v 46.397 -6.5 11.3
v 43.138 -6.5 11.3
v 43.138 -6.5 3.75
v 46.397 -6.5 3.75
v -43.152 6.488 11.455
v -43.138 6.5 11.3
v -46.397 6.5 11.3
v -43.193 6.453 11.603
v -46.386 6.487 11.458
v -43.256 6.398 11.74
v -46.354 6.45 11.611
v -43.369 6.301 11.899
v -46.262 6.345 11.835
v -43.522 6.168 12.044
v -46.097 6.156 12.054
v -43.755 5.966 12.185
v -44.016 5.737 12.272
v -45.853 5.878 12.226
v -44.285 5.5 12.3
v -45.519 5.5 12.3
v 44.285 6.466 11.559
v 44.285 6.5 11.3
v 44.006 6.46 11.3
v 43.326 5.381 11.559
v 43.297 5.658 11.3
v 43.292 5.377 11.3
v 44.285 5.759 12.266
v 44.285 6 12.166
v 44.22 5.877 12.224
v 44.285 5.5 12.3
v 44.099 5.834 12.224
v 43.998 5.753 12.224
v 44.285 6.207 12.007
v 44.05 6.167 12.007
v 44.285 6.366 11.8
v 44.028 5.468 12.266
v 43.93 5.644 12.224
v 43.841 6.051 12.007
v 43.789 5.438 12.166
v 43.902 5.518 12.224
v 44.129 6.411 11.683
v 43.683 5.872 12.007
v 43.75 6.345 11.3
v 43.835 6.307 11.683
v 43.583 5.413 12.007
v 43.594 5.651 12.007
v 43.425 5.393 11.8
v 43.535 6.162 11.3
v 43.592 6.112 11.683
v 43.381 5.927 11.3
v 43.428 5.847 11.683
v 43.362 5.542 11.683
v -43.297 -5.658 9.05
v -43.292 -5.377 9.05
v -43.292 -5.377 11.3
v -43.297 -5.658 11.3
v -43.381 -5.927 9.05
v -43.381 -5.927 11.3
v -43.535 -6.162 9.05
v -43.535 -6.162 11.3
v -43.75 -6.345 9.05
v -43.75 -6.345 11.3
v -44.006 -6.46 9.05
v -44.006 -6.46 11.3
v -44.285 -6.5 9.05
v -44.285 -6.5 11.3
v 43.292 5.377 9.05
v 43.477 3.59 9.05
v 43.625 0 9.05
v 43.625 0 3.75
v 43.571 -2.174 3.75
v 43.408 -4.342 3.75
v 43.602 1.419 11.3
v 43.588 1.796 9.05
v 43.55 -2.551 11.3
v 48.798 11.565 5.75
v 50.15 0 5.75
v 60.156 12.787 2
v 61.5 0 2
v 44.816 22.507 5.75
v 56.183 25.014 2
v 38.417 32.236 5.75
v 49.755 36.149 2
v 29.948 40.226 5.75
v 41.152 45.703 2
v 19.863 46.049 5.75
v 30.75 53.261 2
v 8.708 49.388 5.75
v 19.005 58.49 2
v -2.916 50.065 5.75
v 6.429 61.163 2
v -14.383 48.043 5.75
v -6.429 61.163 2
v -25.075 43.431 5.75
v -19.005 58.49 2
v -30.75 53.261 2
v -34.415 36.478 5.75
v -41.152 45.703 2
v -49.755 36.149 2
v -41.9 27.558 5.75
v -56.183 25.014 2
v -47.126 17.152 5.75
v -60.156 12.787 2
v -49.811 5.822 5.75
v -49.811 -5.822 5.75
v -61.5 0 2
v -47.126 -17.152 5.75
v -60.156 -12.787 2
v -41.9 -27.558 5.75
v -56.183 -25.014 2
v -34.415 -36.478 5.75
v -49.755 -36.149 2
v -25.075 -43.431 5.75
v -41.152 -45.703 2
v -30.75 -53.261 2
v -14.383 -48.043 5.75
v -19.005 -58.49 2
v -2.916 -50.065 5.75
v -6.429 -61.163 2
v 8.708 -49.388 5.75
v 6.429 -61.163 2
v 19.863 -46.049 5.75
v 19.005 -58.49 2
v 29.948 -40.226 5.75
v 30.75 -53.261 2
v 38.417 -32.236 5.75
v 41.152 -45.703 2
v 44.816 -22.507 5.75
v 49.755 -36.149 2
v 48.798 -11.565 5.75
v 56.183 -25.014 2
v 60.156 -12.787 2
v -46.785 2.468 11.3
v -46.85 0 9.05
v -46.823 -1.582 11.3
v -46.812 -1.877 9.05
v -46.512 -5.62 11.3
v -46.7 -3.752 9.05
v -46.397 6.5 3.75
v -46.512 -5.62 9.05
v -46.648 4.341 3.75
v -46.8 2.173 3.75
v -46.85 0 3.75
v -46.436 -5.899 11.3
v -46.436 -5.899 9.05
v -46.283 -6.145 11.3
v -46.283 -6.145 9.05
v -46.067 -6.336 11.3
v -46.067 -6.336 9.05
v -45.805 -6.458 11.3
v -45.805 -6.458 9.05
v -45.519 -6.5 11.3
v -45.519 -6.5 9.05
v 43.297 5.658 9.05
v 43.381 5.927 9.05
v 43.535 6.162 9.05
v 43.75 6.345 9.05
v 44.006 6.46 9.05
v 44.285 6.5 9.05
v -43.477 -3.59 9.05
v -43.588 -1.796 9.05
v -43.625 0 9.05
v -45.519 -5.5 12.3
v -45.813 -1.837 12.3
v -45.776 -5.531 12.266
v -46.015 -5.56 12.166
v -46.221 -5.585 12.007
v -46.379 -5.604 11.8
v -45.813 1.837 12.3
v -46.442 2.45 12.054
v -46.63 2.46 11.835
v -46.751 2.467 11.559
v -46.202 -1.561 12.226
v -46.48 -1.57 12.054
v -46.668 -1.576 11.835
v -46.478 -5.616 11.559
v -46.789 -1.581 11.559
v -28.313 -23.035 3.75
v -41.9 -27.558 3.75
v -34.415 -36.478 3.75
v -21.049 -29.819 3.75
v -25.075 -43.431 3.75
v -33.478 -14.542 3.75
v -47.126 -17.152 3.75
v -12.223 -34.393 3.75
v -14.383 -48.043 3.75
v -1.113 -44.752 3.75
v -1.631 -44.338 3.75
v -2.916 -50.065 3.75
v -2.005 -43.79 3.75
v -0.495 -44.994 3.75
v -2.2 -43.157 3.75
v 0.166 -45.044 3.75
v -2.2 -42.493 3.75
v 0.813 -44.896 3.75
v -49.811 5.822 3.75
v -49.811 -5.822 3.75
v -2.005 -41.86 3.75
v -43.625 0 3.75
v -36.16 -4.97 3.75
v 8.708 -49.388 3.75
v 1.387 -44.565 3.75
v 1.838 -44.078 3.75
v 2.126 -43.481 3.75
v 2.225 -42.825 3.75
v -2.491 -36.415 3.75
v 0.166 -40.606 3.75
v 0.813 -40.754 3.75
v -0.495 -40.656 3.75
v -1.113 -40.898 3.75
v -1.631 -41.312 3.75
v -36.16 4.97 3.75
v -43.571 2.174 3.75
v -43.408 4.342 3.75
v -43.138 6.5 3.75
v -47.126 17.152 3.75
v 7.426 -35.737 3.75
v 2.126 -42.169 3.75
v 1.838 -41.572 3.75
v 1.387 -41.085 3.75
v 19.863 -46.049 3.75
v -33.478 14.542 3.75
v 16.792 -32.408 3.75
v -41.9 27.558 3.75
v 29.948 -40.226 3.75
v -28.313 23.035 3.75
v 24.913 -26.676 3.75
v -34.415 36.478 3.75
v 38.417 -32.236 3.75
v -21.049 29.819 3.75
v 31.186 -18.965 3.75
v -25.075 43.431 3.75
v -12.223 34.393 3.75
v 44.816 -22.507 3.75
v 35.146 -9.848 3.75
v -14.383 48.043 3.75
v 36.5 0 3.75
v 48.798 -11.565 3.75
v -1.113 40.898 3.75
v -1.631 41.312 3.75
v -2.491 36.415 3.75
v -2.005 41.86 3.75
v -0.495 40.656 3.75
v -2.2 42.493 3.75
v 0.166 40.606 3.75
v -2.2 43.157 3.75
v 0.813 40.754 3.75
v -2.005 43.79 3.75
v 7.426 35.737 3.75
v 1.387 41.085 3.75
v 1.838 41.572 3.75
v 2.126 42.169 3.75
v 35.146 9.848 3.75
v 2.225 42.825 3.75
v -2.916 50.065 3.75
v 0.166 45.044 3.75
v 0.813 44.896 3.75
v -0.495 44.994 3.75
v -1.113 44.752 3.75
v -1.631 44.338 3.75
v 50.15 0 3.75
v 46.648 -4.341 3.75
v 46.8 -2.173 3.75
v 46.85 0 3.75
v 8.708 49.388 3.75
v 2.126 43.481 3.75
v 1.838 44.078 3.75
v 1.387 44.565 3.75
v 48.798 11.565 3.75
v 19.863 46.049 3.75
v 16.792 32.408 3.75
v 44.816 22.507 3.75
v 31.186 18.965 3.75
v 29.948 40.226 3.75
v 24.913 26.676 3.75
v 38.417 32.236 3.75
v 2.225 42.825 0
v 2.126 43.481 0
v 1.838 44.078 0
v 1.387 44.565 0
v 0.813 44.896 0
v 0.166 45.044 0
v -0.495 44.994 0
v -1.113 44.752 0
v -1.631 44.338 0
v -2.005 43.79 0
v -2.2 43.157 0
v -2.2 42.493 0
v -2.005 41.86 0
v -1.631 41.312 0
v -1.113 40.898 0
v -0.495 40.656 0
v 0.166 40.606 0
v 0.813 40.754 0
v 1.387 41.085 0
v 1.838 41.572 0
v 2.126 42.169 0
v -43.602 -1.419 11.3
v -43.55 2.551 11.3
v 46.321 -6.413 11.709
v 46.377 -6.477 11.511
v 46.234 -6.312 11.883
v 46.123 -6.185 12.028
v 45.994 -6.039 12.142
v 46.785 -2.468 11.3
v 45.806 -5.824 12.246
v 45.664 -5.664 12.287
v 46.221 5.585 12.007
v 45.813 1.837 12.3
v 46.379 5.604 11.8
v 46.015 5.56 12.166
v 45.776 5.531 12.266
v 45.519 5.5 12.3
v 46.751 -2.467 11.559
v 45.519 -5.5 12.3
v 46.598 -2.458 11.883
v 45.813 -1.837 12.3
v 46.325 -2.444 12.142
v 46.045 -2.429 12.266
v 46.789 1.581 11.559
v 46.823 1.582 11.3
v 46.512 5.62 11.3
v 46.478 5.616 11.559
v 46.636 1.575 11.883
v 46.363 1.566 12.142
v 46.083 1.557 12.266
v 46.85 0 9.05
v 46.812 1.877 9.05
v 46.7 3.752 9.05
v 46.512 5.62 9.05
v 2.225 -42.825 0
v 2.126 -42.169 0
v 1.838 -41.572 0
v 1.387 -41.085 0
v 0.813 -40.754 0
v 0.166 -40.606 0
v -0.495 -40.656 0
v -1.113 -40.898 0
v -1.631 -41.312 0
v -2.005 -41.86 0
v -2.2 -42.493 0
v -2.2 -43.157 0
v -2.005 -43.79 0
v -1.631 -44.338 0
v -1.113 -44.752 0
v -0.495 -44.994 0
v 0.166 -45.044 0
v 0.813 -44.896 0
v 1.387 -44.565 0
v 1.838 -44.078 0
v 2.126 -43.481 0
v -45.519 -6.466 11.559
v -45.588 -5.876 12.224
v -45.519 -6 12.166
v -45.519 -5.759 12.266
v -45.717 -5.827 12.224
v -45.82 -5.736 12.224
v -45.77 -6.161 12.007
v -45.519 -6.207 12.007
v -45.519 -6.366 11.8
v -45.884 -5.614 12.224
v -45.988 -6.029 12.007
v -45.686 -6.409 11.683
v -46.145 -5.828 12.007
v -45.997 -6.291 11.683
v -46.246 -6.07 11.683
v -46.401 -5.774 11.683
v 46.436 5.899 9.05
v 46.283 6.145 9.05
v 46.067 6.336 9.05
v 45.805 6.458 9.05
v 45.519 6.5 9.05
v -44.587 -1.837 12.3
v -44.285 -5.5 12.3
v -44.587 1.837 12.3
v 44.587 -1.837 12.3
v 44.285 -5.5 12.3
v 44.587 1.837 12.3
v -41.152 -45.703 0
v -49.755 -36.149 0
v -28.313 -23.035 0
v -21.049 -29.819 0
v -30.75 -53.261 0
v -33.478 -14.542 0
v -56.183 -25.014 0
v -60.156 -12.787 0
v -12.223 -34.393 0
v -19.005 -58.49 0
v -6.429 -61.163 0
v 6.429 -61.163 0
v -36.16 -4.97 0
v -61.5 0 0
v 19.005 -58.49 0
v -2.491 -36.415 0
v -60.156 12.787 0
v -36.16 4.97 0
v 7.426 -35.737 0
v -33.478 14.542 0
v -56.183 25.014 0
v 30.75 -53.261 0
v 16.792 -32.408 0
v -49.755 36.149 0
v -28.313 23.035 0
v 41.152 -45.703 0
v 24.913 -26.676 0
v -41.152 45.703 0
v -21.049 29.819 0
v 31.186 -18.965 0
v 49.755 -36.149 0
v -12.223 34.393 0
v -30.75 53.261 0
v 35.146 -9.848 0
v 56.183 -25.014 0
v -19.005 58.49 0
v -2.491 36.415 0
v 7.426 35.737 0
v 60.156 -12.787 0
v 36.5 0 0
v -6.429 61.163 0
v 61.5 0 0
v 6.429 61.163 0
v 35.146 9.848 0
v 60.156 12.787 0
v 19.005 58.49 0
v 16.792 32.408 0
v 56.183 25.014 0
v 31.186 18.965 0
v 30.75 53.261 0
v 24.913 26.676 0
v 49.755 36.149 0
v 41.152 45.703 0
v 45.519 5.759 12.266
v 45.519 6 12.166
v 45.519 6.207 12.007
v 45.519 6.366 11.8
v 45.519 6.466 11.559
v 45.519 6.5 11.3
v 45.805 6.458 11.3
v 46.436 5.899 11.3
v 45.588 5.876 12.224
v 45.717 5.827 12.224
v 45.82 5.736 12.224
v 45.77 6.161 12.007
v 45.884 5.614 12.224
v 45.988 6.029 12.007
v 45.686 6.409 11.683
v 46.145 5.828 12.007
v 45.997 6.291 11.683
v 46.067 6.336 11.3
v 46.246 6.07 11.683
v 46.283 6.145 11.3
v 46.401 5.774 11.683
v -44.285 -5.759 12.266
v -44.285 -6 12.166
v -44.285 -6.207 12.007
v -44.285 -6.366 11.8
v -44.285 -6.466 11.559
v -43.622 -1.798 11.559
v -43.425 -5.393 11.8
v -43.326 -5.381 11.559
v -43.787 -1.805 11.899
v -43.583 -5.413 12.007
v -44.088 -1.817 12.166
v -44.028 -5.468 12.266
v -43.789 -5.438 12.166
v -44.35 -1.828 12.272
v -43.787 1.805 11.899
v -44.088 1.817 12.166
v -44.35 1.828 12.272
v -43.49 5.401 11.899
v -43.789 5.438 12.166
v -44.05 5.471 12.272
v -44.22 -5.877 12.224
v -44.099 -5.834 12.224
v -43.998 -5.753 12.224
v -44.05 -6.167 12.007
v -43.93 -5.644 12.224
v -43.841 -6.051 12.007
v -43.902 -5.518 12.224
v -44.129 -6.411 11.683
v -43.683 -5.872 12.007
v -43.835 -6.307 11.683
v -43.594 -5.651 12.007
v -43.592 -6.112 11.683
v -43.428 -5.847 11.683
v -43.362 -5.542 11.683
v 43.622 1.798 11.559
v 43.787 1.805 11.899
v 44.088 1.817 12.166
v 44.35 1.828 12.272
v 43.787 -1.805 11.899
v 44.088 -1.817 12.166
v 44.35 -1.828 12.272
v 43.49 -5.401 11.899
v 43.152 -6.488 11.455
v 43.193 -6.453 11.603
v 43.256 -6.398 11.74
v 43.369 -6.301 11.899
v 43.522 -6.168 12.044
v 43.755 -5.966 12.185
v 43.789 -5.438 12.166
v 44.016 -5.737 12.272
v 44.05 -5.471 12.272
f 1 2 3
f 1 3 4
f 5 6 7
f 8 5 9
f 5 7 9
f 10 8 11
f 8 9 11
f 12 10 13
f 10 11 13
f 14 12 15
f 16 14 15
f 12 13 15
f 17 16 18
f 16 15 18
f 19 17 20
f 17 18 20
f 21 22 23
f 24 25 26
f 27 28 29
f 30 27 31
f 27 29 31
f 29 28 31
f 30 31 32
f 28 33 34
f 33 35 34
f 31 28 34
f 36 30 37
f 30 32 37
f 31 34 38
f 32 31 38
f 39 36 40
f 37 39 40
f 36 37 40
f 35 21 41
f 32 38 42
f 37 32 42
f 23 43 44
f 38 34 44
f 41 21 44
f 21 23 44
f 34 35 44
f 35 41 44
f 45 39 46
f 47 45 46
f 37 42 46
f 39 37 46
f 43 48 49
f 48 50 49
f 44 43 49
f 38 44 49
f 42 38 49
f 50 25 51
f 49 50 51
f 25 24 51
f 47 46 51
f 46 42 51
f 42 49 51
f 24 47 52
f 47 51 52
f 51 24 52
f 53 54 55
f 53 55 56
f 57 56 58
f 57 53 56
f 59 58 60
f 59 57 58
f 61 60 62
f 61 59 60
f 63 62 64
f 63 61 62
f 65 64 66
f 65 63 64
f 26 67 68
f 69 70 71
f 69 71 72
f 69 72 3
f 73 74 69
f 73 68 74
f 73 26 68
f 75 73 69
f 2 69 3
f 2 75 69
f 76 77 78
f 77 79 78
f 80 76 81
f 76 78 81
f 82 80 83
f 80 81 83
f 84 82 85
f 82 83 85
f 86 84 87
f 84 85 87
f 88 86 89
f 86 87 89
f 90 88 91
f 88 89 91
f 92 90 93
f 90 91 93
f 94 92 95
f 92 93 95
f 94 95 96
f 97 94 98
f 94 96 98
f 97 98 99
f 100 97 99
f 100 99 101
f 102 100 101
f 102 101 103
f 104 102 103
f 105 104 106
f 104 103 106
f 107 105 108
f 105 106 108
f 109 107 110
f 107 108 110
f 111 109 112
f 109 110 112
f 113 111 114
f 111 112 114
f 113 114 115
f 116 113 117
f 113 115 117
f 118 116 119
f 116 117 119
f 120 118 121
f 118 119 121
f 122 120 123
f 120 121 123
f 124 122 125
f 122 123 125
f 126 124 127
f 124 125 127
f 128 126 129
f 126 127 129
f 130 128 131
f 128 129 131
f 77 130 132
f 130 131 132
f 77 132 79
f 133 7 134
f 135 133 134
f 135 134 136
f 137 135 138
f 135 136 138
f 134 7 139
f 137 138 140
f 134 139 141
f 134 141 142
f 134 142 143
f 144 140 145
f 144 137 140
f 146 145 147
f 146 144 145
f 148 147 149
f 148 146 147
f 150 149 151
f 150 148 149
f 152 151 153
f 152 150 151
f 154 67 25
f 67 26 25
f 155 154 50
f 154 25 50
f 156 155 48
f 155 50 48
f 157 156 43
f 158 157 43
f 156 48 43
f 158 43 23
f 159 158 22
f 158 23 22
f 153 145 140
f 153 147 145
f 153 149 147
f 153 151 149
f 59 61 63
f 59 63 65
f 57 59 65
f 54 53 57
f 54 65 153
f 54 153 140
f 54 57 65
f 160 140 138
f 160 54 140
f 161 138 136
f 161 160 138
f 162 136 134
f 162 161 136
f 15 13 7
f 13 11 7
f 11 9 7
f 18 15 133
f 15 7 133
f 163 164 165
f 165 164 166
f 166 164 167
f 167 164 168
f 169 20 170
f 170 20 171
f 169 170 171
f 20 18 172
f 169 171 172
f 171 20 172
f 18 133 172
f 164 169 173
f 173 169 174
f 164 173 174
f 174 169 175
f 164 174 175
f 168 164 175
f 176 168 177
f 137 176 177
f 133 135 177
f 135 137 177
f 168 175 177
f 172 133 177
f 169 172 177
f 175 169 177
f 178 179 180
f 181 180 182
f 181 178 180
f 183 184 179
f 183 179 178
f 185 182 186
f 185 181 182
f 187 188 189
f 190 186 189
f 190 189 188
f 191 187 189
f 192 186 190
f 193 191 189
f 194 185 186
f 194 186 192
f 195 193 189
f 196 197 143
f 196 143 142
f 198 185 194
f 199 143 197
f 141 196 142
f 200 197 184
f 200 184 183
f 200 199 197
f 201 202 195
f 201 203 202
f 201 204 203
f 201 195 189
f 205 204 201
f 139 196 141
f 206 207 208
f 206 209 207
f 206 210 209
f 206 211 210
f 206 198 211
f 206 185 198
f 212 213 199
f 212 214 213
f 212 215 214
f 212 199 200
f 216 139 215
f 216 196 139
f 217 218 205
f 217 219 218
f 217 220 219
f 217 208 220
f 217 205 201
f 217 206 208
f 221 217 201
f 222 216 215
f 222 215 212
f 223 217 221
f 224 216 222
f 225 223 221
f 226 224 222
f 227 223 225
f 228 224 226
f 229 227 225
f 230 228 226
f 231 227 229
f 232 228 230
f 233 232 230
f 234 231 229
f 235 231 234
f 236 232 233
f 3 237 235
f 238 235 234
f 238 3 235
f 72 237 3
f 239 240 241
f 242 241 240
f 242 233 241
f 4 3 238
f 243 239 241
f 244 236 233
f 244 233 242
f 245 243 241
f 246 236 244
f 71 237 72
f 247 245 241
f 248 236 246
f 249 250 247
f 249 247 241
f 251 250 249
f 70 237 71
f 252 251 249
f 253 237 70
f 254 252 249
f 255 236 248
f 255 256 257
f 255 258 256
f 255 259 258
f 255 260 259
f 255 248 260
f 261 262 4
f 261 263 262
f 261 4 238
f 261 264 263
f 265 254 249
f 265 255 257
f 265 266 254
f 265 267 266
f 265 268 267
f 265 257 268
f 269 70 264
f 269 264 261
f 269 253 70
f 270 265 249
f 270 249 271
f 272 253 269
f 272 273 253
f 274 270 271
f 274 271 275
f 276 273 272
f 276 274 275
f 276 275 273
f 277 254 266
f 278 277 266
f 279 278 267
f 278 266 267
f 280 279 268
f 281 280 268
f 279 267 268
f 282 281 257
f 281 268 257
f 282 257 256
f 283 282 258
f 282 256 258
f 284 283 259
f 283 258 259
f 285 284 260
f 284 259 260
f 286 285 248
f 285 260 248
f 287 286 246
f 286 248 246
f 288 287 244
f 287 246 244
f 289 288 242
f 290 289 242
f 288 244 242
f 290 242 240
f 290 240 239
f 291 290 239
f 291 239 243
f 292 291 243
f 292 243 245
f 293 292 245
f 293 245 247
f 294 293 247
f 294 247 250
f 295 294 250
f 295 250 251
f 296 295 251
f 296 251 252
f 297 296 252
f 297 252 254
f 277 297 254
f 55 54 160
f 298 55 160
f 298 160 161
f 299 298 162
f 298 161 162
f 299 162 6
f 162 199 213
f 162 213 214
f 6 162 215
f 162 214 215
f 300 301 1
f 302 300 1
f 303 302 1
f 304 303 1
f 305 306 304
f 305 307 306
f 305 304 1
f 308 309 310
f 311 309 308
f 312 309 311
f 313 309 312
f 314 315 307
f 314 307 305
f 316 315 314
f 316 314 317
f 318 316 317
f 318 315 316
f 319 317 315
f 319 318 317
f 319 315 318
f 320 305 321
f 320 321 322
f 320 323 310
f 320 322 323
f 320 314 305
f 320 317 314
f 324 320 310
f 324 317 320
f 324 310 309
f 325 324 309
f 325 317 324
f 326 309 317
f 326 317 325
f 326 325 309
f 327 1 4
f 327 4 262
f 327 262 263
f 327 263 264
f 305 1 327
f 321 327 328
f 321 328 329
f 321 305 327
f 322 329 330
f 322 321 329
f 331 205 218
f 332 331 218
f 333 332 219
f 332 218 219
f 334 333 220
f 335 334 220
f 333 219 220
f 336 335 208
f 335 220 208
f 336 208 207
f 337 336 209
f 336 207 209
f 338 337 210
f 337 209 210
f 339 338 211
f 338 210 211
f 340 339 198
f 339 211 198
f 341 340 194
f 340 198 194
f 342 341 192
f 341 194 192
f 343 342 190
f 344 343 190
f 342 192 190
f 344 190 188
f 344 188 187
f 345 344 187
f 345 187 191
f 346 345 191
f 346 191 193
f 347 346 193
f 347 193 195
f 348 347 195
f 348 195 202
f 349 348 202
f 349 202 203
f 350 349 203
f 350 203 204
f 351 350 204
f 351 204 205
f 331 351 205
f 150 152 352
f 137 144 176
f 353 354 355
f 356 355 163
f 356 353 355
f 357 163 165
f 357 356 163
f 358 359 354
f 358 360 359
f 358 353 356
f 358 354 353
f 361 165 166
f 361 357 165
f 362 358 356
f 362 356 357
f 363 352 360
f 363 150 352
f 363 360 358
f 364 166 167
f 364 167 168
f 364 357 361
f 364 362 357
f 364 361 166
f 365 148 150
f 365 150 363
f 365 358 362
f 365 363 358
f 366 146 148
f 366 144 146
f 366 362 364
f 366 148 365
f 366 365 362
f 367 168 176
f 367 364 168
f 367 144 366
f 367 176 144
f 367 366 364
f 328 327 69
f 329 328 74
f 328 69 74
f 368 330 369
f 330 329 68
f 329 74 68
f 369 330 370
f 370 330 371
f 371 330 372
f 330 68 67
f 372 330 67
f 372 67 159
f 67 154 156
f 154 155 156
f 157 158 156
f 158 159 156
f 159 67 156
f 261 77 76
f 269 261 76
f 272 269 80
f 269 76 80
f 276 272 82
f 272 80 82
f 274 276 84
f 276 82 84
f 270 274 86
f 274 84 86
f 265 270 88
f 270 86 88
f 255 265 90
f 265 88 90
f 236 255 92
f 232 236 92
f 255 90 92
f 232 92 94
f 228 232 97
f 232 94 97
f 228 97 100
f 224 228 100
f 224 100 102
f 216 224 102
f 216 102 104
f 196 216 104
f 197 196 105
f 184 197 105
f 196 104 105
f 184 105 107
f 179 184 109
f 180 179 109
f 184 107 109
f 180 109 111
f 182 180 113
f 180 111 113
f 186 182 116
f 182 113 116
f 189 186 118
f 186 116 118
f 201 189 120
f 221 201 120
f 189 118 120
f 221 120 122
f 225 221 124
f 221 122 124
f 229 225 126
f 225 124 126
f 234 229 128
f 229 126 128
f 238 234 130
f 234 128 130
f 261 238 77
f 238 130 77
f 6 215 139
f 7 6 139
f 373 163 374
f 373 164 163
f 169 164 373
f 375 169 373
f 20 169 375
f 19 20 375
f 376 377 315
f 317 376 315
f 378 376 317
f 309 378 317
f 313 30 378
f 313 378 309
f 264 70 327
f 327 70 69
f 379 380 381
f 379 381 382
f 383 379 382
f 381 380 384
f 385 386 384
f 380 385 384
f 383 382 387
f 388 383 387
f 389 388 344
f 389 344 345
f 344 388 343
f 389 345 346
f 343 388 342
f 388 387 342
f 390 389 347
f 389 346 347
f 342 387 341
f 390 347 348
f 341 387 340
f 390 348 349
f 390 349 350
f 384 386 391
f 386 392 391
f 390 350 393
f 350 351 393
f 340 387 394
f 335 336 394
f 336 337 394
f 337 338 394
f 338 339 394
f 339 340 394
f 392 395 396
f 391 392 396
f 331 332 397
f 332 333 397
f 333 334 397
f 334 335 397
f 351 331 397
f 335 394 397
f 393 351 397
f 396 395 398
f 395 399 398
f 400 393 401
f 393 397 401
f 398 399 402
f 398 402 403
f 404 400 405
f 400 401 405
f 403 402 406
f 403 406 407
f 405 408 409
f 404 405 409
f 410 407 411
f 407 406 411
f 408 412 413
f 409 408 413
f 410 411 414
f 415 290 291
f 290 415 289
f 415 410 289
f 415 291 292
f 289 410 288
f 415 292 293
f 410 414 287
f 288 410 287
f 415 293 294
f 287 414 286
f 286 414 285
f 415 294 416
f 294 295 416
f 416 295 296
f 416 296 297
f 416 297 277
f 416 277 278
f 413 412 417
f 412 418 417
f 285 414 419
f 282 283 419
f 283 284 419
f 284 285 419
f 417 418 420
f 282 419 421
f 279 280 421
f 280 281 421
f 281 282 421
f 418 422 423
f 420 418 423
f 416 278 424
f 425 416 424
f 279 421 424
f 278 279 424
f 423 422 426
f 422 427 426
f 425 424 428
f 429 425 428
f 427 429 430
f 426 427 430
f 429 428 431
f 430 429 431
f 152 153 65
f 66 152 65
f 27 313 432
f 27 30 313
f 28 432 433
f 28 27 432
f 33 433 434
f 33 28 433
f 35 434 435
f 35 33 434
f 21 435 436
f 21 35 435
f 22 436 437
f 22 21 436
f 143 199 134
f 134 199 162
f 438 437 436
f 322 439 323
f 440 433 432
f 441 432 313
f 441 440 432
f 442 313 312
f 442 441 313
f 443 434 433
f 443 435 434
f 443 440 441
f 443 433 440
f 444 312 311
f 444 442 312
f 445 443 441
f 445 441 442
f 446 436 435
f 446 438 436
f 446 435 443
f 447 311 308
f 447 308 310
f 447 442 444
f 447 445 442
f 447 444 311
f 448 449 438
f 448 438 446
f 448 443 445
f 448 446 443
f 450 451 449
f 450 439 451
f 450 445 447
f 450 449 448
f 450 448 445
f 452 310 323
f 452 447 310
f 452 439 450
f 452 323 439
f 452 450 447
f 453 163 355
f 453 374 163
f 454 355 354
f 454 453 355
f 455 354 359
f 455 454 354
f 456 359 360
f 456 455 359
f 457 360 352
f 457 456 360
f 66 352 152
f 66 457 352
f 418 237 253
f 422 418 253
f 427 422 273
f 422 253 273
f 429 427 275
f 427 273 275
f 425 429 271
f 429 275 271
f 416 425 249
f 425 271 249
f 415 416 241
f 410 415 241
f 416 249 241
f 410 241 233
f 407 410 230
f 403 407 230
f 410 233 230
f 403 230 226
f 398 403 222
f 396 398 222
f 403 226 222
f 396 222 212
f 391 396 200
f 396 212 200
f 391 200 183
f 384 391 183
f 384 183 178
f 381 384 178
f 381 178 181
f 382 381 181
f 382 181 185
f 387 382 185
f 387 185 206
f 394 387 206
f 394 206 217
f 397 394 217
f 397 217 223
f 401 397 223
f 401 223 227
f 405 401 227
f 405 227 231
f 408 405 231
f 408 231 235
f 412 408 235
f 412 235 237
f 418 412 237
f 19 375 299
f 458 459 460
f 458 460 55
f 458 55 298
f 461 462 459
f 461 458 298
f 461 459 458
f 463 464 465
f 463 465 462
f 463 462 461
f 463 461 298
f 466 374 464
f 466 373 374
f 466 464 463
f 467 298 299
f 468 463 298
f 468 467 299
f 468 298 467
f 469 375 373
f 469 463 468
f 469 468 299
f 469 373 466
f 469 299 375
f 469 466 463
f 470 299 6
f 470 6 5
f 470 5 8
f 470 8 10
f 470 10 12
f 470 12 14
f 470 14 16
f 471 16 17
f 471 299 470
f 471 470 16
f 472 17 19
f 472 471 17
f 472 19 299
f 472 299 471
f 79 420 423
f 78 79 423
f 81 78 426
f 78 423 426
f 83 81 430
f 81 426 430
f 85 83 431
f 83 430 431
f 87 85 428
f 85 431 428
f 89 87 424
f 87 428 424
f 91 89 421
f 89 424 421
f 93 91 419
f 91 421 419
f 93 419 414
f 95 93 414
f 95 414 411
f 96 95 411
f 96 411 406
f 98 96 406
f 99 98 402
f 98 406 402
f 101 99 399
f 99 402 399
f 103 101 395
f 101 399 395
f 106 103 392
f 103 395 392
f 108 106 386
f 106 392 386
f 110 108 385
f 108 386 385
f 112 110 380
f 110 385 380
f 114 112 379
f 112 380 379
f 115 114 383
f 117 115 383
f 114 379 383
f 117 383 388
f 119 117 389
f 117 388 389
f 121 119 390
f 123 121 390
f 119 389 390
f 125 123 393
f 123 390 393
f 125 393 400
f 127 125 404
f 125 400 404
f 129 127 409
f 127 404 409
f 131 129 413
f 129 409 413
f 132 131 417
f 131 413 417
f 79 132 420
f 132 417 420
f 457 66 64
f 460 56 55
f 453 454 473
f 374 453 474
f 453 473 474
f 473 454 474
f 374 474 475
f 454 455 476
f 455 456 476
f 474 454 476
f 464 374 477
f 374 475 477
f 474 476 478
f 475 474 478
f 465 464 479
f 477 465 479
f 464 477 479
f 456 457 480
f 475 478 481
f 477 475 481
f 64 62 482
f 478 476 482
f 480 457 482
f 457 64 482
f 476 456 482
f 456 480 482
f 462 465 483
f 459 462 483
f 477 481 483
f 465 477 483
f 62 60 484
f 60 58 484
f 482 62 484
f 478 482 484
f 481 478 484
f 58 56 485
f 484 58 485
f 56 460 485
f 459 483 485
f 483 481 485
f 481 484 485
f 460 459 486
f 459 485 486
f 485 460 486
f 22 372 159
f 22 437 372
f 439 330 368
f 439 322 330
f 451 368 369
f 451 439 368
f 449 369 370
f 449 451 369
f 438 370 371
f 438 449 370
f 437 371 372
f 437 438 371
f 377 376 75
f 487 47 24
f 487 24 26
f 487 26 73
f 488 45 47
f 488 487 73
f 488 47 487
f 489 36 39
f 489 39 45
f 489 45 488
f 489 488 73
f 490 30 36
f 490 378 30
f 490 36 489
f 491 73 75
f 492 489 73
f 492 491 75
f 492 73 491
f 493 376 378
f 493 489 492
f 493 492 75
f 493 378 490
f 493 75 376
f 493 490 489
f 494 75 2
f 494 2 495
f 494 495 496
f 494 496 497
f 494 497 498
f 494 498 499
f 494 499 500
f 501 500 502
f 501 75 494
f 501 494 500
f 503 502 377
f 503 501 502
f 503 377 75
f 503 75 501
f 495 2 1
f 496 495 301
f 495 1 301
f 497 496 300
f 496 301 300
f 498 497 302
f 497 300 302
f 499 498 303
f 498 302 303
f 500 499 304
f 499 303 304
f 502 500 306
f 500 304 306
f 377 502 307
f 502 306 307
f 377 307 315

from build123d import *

# Parameters (mm, degrees)
F0_R      = 61.5
F1_DEPTH  = 2
F3_R      = 50.15
F4_R      = 61.5
F6_R      = 36.5
F7_DEPTH  = 5.751
F8_R      = 50.15
F8_R_2    = 36.5
F9_DEPTH  = 2
F10_R     = 2.225
F11_DEPTH = 5.751
F13_DEPTH = 2
F15_DEPTH = 6.55
F17_W     = 6.5
F17_H     = 5.3
F18_DEPTH = 5
F20_W     = 6.5
F20_H     = 5.3
F21_DEPTH = 4
F22_R     = 1


with BuildPart() as f1:
    # F0 (on Top) → F1 (new body)
    with BuildSketch(Plane.XY):
        Circle(F0_R)
    extrude(amount=F1_DEPTH)

    # F3 (on offset) → F5 section 0
    with BuildSketch(Plane.XY.offset(5.75)):
        Circle(F3_R)
    # F4 (on face) → F5 section 1
    with BuildSketch(Plane.XY.offset(2)):
        Circle(F4_R)
    loft()

    # F6 (on face) → F7 (cut, through all)
    with BuildSketch(Plane.XY.offset(5.75)):
        Circle(F6_R)
    extrude(amount=-F7_DEPTH, mode=Mode.SUBTRACT)

    # F8 (on face) → F9 (cut)
    with BuildSketch(Plane.XY.offset(5.75)):
        Circle(F8_R)
        Circle(F8_R_2, mode=Mode.SUBTRACT)
    extrude(amount=-F9_DEPTH, mode=Mode.SUBTRACT)

    # F10 (on face) → F11 (cut, through all)
    with BuildSketch(Plane.XY.offset(5.75)):
        with Locations((0, 42.825)):
            Circle(F10_R)
        with Locations((0, -42.825)):
            Circle(F10_R)
    extrude(amount=-F11_DEPTH, mode=Mode.SUBTRACT)

    # F12 (on face) → F13 (join, through all)
    with BuildSketch(Plane.XY.offset(5.75)):
        with BuildLine():
            Line((-43.1380415063, 6.5), (-46.3969018362, 6.5))
            ThreePointArc((-46.3969018362, 6.5), (-46.85, 0), (-46.3969018362, -6.5))
            Line((-46.3969018362, -6.5), (-43.1380415063, -6.5))
            ThreePointArc((-43.1380415063, -6.5), (-43.625, 0), (-43.1380415063, 6.5))
        make_face()
        with BuildLine():
            Line((43.1380415063, -6.5), (46.3969018362, -6.5))
            ThreePointArc((46.3969018362, -6.5), (46.85, 0), (46.3969018362, 6.5))
            Line((46.3969018362, 6.5), (43.1380415063, 6.5))
            ThreePointArc((43.1380415063, 6.5), (43.625, 0), (43.1380415063, -6.5))
        make_face()
    extrude(amount=-F13_DEPTH)

    # F14 (on face) → F15 (join)
    with BuildSketch(Plane.XY.offset(5.75)):
        with BuildLine():
            Line((-43.1380415063, 6.5), (-46.3969018362, 6.5))
            ThreePointArc((-46.3969018362, 6.5), (-46.85, 0), (-46.3969018362, -6.5))
            Line((-46.3969018362, -6.5), (-43.1380415063, -6.5))
            ThreePointArc((-43.1380415063, -6.5), (-43.625, 0), (-43.1380415063, 6.5))
        make_face()
        with BuildLine():
            Line((43.1380415063, -6.5), (46.3969018362, -6.5))
            ThreePointArc((46.3969018362, -6.5), (46.85, 0), (46.3969018362, 6.5))
            Line((46.3969018362, 6.5), (43.1380415063, 6.5))
            ThreePointArc((43.1380415063, 6.5), (43.625, 0), (43.1380415063, -6.5))
        make_face()
    extrude(amount=F15_DEPTH)

    # F17 (on 3pt) → F18 (cut)
    with BuildSketch(Plane.YZ.offset(-43.1380415063)):
        with Locations((-3.25, 6.4)):
            Rectangle(F17_W, F17_H)
    extrude(amount=-F18_DEPTH, mode=Mode.SUBTRACT)

    # F20 (on 3pt) → F21 (cut)
    with BuildSketch(Plane.YZ.offset(43.1380415063)):
        with Locations((3.25, 6.4)):
            Rectangle(F20_W, F20_H)
    extrude(amount=F21_DEPTH, mode=Mode.SUBTRACT)

    # F22
    f22_edges = [f1.edges().sort_by_distance(p)[0] for p in [
        (44.767472, 6.5, 12.3),
        (-44.767472, -6.5, 12.3),
        (-46.85, 0, 12.3),
        (-43.625, 0, 12.3),
        (43.625, 0, 12.3),
        (46.85, 0, 12.3),
        (43.138042, 6.5, 10.675),
        (-46.396902, -6.5, 10.675),
        (-43.138042, -6.5, 10.675),
        (46.396902, 6.5, 10.675),
        (-44.767472, 6.5, 12.3),
        (44.767472, -6.5, 12.3),
    ]]
    fillet(f22_edges, radius=F22_R)


solid = f1.part
